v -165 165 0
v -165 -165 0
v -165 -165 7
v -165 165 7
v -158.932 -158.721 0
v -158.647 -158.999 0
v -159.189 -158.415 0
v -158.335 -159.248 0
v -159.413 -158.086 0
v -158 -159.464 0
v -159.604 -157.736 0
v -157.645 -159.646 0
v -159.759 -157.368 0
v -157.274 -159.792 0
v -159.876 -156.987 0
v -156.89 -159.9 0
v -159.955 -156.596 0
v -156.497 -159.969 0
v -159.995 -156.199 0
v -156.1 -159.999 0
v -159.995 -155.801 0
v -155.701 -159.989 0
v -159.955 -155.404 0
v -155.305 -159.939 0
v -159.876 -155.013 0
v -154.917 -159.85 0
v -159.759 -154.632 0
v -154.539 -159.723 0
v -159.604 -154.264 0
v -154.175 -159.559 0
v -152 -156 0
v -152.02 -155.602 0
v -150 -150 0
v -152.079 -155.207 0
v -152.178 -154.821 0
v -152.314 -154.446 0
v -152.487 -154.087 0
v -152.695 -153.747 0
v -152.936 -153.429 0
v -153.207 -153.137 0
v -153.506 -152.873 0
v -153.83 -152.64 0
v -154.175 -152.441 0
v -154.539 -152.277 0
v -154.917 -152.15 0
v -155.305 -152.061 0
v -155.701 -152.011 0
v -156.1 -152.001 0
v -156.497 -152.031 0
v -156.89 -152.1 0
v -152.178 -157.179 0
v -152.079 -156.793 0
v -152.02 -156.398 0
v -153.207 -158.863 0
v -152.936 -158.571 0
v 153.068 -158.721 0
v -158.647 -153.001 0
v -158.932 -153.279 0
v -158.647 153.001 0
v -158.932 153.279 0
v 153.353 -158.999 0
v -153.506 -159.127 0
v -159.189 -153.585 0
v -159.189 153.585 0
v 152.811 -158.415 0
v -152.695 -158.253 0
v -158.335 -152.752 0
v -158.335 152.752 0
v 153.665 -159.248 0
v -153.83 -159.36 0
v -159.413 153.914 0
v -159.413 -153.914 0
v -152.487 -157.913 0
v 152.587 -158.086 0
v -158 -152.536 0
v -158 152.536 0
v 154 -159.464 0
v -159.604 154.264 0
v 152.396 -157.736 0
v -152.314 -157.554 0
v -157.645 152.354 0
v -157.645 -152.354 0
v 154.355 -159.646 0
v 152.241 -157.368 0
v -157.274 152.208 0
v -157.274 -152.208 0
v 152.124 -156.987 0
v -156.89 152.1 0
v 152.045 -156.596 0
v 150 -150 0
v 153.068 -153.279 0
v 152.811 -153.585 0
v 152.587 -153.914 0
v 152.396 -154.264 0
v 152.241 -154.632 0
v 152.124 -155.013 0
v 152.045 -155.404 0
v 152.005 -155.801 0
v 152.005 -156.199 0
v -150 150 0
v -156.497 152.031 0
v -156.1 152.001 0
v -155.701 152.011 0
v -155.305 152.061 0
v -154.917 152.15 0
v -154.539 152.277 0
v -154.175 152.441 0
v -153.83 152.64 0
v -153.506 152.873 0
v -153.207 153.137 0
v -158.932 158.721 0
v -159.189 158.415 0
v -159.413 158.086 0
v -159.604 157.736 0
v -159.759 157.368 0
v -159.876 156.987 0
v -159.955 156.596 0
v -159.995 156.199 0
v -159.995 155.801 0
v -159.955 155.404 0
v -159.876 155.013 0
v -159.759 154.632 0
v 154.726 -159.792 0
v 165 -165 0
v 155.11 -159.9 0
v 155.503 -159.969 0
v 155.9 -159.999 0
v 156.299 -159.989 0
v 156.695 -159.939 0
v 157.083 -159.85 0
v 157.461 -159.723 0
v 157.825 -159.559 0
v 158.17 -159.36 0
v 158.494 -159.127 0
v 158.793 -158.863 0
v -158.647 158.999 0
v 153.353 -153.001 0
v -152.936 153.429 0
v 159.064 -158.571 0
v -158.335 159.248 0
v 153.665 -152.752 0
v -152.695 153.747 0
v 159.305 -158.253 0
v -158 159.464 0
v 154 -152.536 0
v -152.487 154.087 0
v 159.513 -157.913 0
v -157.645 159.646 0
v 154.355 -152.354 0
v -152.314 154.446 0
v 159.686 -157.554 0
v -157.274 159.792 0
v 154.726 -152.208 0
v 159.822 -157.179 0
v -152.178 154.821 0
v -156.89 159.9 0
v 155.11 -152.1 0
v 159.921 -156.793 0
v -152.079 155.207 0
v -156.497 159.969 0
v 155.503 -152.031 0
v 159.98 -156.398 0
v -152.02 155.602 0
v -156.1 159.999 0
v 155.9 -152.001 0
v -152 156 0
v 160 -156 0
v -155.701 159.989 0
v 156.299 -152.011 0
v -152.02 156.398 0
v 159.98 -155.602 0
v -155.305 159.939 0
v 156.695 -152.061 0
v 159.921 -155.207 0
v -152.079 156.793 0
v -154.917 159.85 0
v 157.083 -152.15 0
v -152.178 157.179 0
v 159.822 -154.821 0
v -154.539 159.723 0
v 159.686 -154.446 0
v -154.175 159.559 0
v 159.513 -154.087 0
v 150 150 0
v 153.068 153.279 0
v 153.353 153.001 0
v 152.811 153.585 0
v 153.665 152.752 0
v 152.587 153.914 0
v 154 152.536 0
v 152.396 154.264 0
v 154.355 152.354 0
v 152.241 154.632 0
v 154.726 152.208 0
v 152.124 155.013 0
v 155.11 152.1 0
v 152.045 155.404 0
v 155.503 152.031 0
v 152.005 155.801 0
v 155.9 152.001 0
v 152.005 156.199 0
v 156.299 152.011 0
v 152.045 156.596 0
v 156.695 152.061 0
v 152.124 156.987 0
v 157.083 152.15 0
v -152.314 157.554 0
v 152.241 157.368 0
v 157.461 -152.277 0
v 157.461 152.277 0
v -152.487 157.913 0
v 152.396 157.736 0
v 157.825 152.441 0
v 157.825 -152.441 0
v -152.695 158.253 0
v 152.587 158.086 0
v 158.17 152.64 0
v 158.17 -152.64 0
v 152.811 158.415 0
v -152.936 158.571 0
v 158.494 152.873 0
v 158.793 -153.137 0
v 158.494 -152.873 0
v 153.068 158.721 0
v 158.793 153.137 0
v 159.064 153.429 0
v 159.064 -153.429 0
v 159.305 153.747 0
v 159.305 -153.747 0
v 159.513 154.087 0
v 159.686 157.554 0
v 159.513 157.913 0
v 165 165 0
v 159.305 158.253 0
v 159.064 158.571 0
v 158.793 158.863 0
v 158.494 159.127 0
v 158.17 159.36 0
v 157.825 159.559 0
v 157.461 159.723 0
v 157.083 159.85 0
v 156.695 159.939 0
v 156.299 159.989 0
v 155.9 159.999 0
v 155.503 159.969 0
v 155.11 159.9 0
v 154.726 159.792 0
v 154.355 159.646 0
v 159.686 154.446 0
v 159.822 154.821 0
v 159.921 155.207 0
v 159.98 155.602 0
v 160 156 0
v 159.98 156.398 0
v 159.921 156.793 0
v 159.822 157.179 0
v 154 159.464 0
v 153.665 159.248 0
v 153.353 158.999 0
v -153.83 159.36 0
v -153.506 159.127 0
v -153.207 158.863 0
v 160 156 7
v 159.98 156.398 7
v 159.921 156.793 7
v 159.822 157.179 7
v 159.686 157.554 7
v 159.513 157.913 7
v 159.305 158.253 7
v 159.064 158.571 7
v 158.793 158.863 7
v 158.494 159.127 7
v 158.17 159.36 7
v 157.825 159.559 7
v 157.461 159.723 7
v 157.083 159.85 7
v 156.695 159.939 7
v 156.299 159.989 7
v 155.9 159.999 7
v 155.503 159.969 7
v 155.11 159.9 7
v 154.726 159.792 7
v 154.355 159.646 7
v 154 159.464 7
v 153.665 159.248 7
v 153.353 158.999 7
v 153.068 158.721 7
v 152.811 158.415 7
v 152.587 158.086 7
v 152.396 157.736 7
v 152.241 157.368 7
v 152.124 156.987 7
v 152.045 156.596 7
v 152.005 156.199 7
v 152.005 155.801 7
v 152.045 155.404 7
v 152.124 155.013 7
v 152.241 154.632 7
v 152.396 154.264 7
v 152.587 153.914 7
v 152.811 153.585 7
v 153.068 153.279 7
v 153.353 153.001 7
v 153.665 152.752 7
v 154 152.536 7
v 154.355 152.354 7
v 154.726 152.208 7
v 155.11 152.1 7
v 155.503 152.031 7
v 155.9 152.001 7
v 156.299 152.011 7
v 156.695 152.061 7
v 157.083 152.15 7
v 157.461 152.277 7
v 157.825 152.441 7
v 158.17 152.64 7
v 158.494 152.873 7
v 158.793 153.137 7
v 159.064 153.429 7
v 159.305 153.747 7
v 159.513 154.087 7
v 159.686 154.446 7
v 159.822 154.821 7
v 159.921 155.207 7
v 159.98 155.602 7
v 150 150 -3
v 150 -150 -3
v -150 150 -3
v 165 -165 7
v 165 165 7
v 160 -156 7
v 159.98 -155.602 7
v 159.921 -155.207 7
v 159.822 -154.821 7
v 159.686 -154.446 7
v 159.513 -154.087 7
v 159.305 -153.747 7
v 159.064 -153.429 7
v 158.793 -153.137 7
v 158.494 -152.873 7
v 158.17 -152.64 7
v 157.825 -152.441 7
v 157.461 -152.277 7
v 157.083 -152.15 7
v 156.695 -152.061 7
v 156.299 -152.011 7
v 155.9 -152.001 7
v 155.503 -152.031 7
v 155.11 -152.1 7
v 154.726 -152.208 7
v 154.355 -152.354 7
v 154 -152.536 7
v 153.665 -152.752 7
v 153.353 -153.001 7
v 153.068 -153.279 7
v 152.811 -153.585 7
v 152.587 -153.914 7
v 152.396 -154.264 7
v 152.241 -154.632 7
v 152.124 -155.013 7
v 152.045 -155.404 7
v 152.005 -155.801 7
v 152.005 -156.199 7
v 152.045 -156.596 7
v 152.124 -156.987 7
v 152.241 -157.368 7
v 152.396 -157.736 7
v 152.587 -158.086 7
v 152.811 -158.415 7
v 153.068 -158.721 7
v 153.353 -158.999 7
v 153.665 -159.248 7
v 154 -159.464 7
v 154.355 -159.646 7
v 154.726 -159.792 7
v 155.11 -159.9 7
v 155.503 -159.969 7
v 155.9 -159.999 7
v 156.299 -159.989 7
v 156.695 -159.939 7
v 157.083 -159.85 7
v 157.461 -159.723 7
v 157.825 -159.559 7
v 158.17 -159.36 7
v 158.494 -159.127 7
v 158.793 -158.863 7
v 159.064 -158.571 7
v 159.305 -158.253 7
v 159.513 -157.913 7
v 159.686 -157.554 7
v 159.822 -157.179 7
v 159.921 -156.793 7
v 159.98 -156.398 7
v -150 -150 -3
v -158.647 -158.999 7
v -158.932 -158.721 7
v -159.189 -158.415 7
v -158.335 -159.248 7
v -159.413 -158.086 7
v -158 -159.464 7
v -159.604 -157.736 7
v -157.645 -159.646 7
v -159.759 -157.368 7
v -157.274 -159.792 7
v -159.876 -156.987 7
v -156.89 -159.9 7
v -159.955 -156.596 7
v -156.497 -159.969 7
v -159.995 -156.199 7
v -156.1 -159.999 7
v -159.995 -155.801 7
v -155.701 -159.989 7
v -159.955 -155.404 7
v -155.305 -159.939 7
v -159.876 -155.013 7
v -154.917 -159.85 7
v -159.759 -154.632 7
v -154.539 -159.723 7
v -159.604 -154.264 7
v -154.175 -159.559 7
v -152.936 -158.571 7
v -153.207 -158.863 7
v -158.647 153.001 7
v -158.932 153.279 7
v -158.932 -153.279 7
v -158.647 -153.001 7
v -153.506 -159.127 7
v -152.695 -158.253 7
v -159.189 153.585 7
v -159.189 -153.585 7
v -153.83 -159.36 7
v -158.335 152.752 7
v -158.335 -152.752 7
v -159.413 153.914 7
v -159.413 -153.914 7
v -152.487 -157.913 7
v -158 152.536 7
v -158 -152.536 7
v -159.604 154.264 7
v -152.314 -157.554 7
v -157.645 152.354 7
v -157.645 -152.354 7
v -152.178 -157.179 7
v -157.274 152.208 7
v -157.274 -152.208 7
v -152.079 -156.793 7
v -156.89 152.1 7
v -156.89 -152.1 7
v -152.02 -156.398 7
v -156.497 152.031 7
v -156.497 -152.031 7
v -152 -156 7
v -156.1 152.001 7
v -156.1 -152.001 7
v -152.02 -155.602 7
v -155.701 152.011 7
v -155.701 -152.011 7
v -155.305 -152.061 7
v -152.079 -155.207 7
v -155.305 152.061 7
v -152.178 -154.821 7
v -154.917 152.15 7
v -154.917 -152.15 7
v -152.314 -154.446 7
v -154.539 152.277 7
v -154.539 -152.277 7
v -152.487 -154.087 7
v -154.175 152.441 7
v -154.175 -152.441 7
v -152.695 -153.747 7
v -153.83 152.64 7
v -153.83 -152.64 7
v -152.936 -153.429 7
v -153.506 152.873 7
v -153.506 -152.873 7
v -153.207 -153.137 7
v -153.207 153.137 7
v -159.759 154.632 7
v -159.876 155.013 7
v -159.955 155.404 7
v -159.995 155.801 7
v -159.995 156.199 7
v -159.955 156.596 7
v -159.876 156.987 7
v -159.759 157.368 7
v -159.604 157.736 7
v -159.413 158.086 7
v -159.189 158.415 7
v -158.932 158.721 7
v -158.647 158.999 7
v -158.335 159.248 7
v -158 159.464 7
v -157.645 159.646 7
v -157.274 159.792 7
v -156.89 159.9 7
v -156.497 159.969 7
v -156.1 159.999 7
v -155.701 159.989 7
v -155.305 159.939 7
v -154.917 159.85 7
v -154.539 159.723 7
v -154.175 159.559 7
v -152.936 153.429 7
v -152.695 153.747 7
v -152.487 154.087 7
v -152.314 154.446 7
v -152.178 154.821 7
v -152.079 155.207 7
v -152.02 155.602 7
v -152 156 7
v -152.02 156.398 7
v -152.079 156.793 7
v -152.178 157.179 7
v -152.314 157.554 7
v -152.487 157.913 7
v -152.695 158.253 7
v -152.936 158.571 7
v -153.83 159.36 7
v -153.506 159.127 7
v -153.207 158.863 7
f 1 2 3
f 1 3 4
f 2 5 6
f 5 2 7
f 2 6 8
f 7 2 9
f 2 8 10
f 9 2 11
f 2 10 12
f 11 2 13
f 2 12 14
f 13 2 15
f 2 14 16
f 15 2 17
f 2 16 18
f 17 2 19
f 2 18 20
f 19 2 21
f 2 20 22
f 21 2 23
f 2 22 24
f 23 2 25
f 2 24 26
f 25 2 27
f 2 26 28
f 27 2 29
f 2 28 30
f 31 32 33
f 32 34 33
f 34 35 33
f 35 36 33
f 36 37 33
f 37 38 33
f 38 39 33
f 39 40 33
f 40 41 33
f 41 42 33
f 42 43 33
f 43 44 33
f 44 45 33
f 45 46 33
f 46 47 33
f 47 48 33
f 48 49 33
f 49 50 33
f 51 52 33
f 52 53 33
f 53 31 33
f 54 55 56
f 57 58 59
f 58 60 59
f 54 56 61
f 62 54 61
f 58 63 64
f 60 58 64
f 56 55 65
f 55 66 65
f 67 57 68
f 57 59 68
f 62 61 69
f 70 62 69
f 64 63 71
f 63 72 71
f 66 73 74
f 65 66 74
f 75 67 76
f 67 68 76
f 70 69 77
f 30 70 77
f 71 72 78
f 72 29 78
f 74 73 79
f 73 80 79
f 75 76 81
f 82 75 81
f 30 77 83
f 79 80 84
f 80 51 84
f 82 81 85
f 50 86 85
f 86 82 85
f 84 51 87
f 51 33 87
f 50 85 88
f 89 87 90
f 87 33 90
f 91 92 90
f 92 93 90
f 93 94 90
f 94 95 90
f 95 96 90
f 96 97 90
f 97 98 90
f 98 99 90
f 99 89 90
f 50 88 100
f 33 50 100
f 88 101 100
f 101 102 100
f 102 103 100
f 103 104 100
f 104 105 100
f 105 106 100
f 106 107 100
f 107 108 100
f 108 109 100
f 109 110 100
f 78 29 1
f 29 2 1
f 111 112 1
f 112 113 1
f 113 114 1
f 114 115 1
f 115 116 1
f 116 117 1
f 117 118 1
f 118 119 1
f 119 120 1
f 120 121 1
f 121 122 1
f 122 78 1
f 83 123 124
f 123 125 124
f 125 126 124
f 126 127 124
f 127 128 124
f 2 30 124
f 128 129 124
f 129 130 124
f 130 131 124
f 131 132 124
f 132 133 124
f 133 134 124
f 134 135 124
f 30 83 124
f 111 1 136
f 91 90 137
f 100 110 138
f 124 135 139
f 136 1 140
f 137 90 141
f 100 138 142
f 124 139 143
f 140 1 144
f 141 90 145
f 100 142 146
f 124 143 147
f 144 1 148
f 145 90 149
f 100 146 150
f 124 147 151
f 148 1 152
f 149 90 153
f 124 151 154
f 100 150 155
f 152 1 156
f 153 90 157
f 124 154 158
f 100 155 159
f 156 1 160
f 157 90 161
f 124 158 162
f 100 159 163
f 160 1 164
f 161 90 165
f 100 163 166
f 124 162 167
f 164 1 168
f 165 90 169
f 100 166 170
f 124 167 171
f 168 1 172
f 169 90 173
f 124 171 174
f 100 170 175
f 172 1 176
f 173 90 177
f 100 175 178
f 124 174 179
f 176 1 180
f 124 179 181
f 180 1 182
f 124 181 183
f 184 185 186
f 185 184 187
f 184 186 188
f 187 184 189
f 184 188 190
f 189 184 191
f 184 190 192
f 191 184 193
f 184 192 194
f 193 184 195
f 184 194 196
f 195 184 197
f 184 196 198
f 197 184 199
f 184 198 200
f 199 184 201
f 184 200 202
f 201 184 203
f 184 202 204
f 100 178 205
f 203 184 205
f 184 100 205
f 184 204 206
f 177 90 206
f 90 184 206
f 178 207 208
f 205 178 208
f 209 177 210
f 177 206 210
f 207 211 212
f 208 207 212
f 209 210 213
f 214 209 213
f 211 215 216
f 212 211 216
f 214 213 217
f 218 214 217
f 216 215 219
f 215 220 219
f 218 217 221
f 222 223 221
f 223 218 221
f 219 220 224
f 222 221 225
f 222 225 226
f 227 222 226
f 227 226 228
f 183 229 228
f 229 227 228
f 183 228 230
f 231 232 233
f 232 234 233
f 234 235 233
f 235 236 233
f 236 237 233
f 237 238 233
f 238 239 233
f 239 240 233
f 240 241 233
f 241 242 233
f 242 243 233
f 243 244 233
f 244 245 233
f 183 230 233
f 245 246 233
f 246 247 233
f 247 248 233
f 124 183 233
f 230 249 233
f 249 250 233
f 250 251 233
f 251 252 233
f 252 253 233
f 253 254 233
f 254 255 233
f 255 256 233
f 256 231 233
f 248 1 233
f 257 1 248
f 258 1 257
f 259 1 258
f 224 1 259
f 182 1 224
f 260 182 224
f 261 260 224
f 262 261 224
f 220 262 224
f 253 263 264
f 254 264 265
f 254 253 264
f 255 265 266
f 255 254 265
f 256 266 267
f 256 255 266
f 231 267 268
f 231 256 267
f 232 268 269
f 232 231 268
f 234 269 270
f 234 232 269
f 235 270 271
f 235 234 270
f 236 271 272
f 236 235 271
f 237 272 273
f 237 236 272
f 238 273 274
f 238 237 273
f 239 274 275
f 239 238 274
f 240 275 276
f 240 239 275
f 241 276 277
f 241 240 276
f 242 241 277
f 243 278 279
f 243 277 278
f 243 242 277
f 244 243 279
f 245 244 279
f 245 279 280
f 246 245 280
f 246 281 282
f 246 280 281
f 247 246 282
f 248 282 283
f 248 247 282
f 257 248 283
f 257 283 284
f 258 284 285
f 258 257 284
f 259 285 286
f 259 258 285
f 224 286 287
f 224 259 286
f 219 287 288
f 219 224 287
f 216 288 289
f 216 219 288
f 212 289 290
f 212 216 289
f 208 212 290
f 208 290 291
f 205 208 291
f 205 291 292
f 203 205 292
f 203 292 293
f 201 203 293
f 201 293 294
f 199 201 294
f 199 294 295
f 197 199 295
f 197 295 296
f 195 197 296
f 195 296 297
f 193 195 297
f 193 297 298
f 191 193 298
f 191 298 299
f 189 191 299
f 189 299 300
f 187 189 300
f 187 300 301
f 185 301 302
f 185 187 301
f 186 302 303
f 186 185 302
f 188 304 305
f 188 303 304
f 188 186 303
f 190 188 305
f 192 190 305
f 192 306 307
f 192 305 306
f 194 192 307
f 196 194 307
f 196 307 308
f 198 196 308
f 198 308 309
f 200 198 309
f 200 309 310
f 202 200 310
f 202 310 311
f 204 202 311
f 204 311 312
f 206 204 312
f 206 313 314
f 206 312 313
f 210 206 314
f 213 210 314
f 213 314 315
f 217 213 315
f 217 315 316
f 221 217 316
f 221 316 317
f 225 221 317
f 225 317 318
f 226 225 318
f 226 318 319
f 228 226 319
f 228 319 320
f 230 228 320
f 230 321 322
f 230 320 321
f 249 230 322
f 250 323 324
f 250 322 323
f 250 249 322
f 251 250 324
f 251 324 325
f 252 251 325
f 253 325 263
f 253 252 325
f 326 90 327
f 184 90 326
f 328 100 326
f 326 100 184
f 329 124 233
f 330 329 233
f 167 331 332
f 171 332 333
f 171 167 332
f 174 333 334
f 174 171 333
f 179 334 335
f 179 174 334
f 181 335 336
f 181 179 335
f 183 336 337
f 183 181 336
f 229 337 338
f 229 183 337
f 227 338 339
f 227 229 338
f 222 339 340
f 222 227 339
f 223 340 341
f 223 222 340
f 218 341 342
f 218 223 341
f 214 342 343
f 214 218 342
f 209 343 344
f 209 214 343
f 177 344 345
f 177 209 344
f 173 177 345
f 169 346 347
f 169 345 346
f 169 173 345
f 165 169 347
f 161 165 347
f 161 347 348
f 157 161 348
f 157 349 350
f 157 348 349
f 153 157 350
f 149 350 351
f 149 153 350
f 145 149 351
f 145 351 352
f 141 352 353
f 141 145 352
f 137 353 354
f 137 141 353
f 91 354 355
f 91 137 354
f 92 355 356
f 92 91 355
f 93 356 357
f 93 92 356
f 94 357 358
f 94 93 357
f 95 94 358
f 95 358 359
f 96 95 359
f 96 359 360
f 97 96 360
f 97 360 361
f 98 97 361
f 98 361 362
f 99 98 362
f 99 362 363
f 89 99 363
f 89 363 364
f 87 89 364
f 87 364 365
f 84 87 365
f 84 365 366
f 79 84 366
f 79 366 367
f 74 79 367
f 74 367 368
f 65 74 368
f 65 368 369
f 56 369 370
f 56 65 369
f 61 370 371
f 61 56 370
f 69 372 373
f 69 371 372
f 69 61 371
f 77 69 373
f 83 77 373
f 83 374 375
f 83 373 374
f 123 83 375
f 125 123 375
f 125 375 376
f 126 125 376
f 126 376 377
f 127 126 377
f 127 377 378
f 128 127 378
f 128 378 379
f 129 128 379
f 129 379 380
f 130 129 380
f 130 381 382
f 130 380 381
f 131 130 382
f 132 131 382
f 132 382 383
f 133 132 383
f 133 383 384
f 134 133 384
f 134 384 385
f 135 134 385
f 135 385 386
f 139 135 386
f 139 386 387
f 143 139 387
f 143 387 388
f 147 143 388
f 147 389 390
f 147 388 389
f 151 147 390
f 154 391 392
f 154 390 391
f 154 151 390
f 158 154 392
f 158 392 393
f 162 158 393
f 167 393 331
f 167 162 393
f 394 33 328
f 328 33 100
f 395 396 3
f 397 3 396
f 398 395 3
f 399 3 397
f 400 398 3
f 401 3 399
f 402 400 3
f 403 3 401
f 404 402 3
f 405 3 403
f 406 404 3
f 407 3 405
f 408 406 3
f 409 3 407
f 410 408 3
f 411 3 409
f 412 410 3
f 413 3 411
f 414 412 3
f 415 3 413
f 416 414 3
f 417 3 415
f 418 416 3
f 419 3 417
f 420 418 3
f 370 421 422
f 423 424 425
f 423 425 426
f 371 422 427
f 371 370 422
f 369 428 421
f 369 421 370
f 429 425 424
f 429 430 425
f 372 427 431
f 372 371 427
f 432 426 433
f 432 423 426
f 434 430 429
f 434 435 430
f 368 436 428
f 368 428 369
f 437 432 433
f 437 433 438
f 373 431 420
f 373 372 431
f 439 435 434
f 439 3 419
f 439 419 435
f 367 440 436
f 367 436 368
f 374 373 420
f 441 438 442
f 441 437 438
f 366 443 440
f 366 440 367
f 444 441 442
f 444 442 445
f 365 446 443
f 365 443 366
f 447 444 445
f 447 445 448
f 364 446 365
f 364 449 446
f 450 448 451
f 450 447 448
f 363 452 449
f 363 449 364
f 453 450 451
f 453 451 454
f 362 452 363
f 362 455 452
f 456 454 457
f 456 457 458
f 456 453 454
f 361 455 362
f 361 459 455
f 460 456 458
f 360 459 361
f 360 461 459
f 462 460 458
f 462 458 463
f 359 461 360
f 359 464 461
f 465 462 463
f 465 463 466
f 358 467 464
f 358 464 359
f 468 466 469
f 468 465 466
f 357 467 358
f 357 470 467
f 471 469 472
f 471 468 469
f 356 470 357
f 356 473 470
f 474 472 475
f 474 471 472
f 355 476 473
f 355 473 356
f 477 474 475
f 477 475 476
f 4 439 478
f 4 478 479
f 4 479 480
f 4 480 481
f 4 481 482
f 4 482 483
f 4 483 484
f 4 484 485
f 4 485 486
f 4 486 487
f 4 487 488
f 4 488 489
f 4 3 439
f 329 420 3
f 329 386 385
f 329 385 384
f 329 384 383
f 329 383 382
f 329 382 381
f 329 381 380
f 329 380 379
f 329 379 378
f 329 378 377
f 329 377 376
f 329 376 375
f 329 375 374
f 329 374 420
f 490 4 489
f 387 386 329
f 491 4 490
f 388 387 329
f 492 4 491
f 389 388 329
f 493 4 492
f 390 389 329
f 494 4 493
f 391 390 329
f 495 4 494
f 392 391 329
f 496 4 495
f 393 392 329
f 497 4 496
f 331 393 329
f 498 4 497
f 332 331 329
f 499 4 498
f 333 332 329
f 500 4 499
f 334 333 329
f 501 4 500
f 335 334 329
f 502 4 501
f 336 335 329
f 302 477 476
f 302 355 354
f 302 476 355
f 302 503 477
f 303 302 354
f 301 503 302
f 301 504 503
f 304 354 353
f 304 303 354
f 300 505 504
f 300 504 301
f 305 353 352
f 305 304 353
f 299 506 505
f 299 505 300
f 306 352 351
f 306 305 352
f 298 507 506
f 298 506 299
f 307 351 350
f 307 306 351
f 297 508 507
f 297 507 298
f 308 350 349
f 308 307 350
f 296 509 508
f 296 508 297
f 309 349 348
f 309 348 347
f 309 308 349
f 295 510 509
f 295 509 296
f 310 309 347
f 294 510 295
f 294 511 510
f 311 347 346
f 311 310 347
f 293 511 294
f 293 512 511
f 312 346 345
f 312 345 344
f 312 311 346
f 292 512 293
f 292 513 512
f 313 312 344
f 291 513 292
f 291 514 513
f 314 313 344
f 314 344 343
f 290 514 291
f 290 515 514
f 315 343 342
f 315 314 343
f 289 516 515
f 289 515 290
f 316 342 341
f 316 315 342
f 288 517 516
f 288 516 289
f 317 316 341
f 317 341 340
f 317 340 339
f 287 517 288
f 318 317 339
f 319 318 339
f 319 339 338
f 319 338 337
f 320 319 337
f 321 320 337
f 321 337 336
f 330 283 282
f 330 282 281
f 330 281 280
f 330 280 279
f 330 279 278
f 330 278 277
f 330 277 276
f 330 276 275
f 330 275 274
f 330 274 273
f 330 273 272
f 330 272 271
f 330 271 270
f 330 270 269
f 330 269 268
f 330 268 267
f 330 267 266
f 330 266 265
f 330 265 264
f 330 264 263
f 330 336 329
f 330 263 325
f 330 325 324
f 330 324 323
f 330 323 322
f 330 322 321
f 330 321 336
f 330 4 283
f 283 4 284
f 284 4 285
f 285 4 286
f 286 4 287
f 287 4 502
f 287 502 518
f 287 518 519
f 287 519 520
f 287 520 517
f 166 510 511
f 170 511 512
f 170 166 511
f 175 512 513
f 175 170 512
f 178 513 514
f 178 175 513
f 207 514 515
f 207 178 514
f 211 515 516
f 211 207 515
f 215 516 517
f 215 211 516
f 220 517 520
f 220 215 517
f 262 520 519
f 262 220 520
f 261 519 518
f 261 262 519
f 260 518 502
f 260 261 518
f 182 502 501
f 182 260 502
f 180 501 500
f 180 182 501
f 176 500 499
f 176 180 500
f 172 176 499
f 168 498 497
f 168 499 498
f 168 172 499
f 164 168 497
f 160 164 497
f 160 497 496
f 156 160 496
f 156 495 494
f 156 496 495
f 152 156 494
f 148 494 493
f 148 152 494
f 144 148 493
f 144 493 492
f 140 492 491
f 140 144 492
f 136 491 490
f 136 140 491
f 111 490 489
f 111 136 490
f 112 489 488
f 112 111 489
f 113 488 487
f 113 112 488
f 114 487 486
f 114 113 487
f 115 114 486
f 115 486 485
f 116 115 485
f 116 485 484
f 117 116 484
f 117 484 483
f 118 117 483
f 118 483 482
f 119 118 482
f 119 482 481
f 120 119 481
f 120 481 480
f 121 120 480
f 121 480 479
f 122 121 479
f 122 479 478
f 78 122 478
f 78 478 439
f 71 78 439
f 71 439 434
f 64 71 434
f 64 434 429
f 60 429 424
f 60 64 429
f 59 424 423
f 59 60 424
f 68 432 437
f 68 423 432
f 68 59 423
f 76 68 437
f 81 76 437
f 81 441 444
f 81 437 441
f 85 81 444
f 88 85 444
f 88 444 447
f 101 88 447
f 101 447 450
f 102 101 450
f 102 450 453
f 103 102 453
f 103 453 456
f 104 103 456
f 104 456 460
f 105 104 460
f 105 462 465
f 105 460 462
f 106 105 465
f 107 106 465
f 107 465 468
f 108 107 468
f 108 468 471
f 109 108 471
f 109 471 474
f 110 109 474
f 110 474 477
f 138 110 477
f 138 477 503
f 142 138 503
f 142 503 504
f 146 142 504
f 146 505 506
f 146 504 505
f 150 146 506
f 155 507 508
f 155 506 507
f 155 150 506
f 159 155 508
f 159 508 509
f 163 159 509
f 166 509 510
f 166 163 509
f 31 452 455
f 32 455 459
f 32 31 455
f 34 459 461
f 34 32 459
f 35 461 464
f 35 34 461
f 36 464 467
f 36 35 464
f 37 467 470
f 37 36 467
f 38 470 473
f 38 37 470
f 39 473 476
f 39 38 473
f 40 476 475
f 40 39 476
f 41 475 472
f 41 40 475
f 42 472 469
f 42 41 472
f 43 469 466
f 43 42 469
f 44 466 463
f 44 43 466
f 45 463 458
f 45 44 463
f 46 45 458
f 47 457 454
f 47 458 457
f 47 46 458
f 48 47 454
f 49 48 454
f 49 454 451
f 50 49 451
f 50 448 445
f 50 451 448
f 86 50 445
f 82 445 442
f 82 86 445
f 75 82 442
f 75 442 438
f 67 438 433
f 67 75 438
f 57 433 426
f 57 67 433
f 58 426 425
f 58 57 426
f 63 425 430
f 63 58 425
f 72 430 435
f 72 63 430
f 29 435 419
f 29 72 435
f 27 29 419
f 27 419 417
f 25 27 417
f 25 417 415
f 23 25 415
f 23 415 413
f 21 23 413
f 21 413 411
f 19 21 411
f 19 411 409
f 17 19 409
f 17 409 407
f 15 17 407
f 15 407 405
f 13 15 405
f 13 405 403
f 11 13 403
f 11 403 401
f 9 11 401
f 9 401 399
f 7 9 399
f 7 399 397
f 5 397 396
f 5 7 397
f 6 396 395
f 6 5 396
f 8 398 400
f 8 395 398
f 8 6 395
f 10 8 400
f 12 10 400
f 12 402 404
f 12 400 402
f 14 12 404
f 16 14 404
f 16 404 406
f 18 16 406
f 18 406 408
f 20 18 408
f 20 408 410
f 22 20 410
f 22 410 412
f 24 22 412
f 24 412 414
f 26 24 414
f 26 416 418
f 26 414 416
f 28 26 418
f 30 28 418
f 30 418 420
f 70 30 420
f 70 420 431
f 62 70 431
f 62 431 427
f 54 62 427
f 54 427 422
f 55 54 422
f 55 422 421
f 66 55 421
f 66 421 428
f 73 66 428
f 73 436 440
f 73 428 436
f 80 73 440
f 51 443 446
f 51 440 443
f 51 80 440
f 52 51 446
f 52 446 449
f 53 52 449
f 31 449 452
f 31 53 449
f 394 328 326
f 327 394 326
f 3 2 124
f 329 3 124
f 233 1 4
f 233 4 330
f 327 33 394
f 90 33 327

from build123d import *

# Parameters (mm, degrees)
F0_W     = 330
F0_H     = 330
F0_W_2   = 300
F0_H_2   = 300
F1_DEPTH = 7
F2_DEPTH = 3
F3_R     = 4
F4_DEPTH = 8


with BuildPart() as f1:
    # F0 (on Top) → F1 (new body)
    with BuildSketch(Plane.XY):
        Rectangle(F0_W, F0_H)
        Rectangle(F0_W_2, F0_H_2, mode=Mode.SUBTRACT)
        Rectangle(F0_W_2, F0_H_2)
    extrude(amount=F1_DEPTH)

    # F0 (on Top) → F2 (join)
    with BuildSketch(Plane.XY):
        Rectangle(F0_W_2, F0_H_2)
    extrude(amount=-F2_DEPTH)

    # F3 (on Top) → F4 (cut)
    with BuildSketch(Plane.XY):
        with Locations((-156, 156)):
            Circle(F3_R)
        with Locations((156, 156)):
            Circle(F3_R)
        with Locations((156, -156)):
            Circle(F3_R)
        with Locations((-156, -156)):
            Circle(F3_R)
    extrude(amount=F4_DEPTH, mode=Mode.SUBTRACT)


solid = f1.part
